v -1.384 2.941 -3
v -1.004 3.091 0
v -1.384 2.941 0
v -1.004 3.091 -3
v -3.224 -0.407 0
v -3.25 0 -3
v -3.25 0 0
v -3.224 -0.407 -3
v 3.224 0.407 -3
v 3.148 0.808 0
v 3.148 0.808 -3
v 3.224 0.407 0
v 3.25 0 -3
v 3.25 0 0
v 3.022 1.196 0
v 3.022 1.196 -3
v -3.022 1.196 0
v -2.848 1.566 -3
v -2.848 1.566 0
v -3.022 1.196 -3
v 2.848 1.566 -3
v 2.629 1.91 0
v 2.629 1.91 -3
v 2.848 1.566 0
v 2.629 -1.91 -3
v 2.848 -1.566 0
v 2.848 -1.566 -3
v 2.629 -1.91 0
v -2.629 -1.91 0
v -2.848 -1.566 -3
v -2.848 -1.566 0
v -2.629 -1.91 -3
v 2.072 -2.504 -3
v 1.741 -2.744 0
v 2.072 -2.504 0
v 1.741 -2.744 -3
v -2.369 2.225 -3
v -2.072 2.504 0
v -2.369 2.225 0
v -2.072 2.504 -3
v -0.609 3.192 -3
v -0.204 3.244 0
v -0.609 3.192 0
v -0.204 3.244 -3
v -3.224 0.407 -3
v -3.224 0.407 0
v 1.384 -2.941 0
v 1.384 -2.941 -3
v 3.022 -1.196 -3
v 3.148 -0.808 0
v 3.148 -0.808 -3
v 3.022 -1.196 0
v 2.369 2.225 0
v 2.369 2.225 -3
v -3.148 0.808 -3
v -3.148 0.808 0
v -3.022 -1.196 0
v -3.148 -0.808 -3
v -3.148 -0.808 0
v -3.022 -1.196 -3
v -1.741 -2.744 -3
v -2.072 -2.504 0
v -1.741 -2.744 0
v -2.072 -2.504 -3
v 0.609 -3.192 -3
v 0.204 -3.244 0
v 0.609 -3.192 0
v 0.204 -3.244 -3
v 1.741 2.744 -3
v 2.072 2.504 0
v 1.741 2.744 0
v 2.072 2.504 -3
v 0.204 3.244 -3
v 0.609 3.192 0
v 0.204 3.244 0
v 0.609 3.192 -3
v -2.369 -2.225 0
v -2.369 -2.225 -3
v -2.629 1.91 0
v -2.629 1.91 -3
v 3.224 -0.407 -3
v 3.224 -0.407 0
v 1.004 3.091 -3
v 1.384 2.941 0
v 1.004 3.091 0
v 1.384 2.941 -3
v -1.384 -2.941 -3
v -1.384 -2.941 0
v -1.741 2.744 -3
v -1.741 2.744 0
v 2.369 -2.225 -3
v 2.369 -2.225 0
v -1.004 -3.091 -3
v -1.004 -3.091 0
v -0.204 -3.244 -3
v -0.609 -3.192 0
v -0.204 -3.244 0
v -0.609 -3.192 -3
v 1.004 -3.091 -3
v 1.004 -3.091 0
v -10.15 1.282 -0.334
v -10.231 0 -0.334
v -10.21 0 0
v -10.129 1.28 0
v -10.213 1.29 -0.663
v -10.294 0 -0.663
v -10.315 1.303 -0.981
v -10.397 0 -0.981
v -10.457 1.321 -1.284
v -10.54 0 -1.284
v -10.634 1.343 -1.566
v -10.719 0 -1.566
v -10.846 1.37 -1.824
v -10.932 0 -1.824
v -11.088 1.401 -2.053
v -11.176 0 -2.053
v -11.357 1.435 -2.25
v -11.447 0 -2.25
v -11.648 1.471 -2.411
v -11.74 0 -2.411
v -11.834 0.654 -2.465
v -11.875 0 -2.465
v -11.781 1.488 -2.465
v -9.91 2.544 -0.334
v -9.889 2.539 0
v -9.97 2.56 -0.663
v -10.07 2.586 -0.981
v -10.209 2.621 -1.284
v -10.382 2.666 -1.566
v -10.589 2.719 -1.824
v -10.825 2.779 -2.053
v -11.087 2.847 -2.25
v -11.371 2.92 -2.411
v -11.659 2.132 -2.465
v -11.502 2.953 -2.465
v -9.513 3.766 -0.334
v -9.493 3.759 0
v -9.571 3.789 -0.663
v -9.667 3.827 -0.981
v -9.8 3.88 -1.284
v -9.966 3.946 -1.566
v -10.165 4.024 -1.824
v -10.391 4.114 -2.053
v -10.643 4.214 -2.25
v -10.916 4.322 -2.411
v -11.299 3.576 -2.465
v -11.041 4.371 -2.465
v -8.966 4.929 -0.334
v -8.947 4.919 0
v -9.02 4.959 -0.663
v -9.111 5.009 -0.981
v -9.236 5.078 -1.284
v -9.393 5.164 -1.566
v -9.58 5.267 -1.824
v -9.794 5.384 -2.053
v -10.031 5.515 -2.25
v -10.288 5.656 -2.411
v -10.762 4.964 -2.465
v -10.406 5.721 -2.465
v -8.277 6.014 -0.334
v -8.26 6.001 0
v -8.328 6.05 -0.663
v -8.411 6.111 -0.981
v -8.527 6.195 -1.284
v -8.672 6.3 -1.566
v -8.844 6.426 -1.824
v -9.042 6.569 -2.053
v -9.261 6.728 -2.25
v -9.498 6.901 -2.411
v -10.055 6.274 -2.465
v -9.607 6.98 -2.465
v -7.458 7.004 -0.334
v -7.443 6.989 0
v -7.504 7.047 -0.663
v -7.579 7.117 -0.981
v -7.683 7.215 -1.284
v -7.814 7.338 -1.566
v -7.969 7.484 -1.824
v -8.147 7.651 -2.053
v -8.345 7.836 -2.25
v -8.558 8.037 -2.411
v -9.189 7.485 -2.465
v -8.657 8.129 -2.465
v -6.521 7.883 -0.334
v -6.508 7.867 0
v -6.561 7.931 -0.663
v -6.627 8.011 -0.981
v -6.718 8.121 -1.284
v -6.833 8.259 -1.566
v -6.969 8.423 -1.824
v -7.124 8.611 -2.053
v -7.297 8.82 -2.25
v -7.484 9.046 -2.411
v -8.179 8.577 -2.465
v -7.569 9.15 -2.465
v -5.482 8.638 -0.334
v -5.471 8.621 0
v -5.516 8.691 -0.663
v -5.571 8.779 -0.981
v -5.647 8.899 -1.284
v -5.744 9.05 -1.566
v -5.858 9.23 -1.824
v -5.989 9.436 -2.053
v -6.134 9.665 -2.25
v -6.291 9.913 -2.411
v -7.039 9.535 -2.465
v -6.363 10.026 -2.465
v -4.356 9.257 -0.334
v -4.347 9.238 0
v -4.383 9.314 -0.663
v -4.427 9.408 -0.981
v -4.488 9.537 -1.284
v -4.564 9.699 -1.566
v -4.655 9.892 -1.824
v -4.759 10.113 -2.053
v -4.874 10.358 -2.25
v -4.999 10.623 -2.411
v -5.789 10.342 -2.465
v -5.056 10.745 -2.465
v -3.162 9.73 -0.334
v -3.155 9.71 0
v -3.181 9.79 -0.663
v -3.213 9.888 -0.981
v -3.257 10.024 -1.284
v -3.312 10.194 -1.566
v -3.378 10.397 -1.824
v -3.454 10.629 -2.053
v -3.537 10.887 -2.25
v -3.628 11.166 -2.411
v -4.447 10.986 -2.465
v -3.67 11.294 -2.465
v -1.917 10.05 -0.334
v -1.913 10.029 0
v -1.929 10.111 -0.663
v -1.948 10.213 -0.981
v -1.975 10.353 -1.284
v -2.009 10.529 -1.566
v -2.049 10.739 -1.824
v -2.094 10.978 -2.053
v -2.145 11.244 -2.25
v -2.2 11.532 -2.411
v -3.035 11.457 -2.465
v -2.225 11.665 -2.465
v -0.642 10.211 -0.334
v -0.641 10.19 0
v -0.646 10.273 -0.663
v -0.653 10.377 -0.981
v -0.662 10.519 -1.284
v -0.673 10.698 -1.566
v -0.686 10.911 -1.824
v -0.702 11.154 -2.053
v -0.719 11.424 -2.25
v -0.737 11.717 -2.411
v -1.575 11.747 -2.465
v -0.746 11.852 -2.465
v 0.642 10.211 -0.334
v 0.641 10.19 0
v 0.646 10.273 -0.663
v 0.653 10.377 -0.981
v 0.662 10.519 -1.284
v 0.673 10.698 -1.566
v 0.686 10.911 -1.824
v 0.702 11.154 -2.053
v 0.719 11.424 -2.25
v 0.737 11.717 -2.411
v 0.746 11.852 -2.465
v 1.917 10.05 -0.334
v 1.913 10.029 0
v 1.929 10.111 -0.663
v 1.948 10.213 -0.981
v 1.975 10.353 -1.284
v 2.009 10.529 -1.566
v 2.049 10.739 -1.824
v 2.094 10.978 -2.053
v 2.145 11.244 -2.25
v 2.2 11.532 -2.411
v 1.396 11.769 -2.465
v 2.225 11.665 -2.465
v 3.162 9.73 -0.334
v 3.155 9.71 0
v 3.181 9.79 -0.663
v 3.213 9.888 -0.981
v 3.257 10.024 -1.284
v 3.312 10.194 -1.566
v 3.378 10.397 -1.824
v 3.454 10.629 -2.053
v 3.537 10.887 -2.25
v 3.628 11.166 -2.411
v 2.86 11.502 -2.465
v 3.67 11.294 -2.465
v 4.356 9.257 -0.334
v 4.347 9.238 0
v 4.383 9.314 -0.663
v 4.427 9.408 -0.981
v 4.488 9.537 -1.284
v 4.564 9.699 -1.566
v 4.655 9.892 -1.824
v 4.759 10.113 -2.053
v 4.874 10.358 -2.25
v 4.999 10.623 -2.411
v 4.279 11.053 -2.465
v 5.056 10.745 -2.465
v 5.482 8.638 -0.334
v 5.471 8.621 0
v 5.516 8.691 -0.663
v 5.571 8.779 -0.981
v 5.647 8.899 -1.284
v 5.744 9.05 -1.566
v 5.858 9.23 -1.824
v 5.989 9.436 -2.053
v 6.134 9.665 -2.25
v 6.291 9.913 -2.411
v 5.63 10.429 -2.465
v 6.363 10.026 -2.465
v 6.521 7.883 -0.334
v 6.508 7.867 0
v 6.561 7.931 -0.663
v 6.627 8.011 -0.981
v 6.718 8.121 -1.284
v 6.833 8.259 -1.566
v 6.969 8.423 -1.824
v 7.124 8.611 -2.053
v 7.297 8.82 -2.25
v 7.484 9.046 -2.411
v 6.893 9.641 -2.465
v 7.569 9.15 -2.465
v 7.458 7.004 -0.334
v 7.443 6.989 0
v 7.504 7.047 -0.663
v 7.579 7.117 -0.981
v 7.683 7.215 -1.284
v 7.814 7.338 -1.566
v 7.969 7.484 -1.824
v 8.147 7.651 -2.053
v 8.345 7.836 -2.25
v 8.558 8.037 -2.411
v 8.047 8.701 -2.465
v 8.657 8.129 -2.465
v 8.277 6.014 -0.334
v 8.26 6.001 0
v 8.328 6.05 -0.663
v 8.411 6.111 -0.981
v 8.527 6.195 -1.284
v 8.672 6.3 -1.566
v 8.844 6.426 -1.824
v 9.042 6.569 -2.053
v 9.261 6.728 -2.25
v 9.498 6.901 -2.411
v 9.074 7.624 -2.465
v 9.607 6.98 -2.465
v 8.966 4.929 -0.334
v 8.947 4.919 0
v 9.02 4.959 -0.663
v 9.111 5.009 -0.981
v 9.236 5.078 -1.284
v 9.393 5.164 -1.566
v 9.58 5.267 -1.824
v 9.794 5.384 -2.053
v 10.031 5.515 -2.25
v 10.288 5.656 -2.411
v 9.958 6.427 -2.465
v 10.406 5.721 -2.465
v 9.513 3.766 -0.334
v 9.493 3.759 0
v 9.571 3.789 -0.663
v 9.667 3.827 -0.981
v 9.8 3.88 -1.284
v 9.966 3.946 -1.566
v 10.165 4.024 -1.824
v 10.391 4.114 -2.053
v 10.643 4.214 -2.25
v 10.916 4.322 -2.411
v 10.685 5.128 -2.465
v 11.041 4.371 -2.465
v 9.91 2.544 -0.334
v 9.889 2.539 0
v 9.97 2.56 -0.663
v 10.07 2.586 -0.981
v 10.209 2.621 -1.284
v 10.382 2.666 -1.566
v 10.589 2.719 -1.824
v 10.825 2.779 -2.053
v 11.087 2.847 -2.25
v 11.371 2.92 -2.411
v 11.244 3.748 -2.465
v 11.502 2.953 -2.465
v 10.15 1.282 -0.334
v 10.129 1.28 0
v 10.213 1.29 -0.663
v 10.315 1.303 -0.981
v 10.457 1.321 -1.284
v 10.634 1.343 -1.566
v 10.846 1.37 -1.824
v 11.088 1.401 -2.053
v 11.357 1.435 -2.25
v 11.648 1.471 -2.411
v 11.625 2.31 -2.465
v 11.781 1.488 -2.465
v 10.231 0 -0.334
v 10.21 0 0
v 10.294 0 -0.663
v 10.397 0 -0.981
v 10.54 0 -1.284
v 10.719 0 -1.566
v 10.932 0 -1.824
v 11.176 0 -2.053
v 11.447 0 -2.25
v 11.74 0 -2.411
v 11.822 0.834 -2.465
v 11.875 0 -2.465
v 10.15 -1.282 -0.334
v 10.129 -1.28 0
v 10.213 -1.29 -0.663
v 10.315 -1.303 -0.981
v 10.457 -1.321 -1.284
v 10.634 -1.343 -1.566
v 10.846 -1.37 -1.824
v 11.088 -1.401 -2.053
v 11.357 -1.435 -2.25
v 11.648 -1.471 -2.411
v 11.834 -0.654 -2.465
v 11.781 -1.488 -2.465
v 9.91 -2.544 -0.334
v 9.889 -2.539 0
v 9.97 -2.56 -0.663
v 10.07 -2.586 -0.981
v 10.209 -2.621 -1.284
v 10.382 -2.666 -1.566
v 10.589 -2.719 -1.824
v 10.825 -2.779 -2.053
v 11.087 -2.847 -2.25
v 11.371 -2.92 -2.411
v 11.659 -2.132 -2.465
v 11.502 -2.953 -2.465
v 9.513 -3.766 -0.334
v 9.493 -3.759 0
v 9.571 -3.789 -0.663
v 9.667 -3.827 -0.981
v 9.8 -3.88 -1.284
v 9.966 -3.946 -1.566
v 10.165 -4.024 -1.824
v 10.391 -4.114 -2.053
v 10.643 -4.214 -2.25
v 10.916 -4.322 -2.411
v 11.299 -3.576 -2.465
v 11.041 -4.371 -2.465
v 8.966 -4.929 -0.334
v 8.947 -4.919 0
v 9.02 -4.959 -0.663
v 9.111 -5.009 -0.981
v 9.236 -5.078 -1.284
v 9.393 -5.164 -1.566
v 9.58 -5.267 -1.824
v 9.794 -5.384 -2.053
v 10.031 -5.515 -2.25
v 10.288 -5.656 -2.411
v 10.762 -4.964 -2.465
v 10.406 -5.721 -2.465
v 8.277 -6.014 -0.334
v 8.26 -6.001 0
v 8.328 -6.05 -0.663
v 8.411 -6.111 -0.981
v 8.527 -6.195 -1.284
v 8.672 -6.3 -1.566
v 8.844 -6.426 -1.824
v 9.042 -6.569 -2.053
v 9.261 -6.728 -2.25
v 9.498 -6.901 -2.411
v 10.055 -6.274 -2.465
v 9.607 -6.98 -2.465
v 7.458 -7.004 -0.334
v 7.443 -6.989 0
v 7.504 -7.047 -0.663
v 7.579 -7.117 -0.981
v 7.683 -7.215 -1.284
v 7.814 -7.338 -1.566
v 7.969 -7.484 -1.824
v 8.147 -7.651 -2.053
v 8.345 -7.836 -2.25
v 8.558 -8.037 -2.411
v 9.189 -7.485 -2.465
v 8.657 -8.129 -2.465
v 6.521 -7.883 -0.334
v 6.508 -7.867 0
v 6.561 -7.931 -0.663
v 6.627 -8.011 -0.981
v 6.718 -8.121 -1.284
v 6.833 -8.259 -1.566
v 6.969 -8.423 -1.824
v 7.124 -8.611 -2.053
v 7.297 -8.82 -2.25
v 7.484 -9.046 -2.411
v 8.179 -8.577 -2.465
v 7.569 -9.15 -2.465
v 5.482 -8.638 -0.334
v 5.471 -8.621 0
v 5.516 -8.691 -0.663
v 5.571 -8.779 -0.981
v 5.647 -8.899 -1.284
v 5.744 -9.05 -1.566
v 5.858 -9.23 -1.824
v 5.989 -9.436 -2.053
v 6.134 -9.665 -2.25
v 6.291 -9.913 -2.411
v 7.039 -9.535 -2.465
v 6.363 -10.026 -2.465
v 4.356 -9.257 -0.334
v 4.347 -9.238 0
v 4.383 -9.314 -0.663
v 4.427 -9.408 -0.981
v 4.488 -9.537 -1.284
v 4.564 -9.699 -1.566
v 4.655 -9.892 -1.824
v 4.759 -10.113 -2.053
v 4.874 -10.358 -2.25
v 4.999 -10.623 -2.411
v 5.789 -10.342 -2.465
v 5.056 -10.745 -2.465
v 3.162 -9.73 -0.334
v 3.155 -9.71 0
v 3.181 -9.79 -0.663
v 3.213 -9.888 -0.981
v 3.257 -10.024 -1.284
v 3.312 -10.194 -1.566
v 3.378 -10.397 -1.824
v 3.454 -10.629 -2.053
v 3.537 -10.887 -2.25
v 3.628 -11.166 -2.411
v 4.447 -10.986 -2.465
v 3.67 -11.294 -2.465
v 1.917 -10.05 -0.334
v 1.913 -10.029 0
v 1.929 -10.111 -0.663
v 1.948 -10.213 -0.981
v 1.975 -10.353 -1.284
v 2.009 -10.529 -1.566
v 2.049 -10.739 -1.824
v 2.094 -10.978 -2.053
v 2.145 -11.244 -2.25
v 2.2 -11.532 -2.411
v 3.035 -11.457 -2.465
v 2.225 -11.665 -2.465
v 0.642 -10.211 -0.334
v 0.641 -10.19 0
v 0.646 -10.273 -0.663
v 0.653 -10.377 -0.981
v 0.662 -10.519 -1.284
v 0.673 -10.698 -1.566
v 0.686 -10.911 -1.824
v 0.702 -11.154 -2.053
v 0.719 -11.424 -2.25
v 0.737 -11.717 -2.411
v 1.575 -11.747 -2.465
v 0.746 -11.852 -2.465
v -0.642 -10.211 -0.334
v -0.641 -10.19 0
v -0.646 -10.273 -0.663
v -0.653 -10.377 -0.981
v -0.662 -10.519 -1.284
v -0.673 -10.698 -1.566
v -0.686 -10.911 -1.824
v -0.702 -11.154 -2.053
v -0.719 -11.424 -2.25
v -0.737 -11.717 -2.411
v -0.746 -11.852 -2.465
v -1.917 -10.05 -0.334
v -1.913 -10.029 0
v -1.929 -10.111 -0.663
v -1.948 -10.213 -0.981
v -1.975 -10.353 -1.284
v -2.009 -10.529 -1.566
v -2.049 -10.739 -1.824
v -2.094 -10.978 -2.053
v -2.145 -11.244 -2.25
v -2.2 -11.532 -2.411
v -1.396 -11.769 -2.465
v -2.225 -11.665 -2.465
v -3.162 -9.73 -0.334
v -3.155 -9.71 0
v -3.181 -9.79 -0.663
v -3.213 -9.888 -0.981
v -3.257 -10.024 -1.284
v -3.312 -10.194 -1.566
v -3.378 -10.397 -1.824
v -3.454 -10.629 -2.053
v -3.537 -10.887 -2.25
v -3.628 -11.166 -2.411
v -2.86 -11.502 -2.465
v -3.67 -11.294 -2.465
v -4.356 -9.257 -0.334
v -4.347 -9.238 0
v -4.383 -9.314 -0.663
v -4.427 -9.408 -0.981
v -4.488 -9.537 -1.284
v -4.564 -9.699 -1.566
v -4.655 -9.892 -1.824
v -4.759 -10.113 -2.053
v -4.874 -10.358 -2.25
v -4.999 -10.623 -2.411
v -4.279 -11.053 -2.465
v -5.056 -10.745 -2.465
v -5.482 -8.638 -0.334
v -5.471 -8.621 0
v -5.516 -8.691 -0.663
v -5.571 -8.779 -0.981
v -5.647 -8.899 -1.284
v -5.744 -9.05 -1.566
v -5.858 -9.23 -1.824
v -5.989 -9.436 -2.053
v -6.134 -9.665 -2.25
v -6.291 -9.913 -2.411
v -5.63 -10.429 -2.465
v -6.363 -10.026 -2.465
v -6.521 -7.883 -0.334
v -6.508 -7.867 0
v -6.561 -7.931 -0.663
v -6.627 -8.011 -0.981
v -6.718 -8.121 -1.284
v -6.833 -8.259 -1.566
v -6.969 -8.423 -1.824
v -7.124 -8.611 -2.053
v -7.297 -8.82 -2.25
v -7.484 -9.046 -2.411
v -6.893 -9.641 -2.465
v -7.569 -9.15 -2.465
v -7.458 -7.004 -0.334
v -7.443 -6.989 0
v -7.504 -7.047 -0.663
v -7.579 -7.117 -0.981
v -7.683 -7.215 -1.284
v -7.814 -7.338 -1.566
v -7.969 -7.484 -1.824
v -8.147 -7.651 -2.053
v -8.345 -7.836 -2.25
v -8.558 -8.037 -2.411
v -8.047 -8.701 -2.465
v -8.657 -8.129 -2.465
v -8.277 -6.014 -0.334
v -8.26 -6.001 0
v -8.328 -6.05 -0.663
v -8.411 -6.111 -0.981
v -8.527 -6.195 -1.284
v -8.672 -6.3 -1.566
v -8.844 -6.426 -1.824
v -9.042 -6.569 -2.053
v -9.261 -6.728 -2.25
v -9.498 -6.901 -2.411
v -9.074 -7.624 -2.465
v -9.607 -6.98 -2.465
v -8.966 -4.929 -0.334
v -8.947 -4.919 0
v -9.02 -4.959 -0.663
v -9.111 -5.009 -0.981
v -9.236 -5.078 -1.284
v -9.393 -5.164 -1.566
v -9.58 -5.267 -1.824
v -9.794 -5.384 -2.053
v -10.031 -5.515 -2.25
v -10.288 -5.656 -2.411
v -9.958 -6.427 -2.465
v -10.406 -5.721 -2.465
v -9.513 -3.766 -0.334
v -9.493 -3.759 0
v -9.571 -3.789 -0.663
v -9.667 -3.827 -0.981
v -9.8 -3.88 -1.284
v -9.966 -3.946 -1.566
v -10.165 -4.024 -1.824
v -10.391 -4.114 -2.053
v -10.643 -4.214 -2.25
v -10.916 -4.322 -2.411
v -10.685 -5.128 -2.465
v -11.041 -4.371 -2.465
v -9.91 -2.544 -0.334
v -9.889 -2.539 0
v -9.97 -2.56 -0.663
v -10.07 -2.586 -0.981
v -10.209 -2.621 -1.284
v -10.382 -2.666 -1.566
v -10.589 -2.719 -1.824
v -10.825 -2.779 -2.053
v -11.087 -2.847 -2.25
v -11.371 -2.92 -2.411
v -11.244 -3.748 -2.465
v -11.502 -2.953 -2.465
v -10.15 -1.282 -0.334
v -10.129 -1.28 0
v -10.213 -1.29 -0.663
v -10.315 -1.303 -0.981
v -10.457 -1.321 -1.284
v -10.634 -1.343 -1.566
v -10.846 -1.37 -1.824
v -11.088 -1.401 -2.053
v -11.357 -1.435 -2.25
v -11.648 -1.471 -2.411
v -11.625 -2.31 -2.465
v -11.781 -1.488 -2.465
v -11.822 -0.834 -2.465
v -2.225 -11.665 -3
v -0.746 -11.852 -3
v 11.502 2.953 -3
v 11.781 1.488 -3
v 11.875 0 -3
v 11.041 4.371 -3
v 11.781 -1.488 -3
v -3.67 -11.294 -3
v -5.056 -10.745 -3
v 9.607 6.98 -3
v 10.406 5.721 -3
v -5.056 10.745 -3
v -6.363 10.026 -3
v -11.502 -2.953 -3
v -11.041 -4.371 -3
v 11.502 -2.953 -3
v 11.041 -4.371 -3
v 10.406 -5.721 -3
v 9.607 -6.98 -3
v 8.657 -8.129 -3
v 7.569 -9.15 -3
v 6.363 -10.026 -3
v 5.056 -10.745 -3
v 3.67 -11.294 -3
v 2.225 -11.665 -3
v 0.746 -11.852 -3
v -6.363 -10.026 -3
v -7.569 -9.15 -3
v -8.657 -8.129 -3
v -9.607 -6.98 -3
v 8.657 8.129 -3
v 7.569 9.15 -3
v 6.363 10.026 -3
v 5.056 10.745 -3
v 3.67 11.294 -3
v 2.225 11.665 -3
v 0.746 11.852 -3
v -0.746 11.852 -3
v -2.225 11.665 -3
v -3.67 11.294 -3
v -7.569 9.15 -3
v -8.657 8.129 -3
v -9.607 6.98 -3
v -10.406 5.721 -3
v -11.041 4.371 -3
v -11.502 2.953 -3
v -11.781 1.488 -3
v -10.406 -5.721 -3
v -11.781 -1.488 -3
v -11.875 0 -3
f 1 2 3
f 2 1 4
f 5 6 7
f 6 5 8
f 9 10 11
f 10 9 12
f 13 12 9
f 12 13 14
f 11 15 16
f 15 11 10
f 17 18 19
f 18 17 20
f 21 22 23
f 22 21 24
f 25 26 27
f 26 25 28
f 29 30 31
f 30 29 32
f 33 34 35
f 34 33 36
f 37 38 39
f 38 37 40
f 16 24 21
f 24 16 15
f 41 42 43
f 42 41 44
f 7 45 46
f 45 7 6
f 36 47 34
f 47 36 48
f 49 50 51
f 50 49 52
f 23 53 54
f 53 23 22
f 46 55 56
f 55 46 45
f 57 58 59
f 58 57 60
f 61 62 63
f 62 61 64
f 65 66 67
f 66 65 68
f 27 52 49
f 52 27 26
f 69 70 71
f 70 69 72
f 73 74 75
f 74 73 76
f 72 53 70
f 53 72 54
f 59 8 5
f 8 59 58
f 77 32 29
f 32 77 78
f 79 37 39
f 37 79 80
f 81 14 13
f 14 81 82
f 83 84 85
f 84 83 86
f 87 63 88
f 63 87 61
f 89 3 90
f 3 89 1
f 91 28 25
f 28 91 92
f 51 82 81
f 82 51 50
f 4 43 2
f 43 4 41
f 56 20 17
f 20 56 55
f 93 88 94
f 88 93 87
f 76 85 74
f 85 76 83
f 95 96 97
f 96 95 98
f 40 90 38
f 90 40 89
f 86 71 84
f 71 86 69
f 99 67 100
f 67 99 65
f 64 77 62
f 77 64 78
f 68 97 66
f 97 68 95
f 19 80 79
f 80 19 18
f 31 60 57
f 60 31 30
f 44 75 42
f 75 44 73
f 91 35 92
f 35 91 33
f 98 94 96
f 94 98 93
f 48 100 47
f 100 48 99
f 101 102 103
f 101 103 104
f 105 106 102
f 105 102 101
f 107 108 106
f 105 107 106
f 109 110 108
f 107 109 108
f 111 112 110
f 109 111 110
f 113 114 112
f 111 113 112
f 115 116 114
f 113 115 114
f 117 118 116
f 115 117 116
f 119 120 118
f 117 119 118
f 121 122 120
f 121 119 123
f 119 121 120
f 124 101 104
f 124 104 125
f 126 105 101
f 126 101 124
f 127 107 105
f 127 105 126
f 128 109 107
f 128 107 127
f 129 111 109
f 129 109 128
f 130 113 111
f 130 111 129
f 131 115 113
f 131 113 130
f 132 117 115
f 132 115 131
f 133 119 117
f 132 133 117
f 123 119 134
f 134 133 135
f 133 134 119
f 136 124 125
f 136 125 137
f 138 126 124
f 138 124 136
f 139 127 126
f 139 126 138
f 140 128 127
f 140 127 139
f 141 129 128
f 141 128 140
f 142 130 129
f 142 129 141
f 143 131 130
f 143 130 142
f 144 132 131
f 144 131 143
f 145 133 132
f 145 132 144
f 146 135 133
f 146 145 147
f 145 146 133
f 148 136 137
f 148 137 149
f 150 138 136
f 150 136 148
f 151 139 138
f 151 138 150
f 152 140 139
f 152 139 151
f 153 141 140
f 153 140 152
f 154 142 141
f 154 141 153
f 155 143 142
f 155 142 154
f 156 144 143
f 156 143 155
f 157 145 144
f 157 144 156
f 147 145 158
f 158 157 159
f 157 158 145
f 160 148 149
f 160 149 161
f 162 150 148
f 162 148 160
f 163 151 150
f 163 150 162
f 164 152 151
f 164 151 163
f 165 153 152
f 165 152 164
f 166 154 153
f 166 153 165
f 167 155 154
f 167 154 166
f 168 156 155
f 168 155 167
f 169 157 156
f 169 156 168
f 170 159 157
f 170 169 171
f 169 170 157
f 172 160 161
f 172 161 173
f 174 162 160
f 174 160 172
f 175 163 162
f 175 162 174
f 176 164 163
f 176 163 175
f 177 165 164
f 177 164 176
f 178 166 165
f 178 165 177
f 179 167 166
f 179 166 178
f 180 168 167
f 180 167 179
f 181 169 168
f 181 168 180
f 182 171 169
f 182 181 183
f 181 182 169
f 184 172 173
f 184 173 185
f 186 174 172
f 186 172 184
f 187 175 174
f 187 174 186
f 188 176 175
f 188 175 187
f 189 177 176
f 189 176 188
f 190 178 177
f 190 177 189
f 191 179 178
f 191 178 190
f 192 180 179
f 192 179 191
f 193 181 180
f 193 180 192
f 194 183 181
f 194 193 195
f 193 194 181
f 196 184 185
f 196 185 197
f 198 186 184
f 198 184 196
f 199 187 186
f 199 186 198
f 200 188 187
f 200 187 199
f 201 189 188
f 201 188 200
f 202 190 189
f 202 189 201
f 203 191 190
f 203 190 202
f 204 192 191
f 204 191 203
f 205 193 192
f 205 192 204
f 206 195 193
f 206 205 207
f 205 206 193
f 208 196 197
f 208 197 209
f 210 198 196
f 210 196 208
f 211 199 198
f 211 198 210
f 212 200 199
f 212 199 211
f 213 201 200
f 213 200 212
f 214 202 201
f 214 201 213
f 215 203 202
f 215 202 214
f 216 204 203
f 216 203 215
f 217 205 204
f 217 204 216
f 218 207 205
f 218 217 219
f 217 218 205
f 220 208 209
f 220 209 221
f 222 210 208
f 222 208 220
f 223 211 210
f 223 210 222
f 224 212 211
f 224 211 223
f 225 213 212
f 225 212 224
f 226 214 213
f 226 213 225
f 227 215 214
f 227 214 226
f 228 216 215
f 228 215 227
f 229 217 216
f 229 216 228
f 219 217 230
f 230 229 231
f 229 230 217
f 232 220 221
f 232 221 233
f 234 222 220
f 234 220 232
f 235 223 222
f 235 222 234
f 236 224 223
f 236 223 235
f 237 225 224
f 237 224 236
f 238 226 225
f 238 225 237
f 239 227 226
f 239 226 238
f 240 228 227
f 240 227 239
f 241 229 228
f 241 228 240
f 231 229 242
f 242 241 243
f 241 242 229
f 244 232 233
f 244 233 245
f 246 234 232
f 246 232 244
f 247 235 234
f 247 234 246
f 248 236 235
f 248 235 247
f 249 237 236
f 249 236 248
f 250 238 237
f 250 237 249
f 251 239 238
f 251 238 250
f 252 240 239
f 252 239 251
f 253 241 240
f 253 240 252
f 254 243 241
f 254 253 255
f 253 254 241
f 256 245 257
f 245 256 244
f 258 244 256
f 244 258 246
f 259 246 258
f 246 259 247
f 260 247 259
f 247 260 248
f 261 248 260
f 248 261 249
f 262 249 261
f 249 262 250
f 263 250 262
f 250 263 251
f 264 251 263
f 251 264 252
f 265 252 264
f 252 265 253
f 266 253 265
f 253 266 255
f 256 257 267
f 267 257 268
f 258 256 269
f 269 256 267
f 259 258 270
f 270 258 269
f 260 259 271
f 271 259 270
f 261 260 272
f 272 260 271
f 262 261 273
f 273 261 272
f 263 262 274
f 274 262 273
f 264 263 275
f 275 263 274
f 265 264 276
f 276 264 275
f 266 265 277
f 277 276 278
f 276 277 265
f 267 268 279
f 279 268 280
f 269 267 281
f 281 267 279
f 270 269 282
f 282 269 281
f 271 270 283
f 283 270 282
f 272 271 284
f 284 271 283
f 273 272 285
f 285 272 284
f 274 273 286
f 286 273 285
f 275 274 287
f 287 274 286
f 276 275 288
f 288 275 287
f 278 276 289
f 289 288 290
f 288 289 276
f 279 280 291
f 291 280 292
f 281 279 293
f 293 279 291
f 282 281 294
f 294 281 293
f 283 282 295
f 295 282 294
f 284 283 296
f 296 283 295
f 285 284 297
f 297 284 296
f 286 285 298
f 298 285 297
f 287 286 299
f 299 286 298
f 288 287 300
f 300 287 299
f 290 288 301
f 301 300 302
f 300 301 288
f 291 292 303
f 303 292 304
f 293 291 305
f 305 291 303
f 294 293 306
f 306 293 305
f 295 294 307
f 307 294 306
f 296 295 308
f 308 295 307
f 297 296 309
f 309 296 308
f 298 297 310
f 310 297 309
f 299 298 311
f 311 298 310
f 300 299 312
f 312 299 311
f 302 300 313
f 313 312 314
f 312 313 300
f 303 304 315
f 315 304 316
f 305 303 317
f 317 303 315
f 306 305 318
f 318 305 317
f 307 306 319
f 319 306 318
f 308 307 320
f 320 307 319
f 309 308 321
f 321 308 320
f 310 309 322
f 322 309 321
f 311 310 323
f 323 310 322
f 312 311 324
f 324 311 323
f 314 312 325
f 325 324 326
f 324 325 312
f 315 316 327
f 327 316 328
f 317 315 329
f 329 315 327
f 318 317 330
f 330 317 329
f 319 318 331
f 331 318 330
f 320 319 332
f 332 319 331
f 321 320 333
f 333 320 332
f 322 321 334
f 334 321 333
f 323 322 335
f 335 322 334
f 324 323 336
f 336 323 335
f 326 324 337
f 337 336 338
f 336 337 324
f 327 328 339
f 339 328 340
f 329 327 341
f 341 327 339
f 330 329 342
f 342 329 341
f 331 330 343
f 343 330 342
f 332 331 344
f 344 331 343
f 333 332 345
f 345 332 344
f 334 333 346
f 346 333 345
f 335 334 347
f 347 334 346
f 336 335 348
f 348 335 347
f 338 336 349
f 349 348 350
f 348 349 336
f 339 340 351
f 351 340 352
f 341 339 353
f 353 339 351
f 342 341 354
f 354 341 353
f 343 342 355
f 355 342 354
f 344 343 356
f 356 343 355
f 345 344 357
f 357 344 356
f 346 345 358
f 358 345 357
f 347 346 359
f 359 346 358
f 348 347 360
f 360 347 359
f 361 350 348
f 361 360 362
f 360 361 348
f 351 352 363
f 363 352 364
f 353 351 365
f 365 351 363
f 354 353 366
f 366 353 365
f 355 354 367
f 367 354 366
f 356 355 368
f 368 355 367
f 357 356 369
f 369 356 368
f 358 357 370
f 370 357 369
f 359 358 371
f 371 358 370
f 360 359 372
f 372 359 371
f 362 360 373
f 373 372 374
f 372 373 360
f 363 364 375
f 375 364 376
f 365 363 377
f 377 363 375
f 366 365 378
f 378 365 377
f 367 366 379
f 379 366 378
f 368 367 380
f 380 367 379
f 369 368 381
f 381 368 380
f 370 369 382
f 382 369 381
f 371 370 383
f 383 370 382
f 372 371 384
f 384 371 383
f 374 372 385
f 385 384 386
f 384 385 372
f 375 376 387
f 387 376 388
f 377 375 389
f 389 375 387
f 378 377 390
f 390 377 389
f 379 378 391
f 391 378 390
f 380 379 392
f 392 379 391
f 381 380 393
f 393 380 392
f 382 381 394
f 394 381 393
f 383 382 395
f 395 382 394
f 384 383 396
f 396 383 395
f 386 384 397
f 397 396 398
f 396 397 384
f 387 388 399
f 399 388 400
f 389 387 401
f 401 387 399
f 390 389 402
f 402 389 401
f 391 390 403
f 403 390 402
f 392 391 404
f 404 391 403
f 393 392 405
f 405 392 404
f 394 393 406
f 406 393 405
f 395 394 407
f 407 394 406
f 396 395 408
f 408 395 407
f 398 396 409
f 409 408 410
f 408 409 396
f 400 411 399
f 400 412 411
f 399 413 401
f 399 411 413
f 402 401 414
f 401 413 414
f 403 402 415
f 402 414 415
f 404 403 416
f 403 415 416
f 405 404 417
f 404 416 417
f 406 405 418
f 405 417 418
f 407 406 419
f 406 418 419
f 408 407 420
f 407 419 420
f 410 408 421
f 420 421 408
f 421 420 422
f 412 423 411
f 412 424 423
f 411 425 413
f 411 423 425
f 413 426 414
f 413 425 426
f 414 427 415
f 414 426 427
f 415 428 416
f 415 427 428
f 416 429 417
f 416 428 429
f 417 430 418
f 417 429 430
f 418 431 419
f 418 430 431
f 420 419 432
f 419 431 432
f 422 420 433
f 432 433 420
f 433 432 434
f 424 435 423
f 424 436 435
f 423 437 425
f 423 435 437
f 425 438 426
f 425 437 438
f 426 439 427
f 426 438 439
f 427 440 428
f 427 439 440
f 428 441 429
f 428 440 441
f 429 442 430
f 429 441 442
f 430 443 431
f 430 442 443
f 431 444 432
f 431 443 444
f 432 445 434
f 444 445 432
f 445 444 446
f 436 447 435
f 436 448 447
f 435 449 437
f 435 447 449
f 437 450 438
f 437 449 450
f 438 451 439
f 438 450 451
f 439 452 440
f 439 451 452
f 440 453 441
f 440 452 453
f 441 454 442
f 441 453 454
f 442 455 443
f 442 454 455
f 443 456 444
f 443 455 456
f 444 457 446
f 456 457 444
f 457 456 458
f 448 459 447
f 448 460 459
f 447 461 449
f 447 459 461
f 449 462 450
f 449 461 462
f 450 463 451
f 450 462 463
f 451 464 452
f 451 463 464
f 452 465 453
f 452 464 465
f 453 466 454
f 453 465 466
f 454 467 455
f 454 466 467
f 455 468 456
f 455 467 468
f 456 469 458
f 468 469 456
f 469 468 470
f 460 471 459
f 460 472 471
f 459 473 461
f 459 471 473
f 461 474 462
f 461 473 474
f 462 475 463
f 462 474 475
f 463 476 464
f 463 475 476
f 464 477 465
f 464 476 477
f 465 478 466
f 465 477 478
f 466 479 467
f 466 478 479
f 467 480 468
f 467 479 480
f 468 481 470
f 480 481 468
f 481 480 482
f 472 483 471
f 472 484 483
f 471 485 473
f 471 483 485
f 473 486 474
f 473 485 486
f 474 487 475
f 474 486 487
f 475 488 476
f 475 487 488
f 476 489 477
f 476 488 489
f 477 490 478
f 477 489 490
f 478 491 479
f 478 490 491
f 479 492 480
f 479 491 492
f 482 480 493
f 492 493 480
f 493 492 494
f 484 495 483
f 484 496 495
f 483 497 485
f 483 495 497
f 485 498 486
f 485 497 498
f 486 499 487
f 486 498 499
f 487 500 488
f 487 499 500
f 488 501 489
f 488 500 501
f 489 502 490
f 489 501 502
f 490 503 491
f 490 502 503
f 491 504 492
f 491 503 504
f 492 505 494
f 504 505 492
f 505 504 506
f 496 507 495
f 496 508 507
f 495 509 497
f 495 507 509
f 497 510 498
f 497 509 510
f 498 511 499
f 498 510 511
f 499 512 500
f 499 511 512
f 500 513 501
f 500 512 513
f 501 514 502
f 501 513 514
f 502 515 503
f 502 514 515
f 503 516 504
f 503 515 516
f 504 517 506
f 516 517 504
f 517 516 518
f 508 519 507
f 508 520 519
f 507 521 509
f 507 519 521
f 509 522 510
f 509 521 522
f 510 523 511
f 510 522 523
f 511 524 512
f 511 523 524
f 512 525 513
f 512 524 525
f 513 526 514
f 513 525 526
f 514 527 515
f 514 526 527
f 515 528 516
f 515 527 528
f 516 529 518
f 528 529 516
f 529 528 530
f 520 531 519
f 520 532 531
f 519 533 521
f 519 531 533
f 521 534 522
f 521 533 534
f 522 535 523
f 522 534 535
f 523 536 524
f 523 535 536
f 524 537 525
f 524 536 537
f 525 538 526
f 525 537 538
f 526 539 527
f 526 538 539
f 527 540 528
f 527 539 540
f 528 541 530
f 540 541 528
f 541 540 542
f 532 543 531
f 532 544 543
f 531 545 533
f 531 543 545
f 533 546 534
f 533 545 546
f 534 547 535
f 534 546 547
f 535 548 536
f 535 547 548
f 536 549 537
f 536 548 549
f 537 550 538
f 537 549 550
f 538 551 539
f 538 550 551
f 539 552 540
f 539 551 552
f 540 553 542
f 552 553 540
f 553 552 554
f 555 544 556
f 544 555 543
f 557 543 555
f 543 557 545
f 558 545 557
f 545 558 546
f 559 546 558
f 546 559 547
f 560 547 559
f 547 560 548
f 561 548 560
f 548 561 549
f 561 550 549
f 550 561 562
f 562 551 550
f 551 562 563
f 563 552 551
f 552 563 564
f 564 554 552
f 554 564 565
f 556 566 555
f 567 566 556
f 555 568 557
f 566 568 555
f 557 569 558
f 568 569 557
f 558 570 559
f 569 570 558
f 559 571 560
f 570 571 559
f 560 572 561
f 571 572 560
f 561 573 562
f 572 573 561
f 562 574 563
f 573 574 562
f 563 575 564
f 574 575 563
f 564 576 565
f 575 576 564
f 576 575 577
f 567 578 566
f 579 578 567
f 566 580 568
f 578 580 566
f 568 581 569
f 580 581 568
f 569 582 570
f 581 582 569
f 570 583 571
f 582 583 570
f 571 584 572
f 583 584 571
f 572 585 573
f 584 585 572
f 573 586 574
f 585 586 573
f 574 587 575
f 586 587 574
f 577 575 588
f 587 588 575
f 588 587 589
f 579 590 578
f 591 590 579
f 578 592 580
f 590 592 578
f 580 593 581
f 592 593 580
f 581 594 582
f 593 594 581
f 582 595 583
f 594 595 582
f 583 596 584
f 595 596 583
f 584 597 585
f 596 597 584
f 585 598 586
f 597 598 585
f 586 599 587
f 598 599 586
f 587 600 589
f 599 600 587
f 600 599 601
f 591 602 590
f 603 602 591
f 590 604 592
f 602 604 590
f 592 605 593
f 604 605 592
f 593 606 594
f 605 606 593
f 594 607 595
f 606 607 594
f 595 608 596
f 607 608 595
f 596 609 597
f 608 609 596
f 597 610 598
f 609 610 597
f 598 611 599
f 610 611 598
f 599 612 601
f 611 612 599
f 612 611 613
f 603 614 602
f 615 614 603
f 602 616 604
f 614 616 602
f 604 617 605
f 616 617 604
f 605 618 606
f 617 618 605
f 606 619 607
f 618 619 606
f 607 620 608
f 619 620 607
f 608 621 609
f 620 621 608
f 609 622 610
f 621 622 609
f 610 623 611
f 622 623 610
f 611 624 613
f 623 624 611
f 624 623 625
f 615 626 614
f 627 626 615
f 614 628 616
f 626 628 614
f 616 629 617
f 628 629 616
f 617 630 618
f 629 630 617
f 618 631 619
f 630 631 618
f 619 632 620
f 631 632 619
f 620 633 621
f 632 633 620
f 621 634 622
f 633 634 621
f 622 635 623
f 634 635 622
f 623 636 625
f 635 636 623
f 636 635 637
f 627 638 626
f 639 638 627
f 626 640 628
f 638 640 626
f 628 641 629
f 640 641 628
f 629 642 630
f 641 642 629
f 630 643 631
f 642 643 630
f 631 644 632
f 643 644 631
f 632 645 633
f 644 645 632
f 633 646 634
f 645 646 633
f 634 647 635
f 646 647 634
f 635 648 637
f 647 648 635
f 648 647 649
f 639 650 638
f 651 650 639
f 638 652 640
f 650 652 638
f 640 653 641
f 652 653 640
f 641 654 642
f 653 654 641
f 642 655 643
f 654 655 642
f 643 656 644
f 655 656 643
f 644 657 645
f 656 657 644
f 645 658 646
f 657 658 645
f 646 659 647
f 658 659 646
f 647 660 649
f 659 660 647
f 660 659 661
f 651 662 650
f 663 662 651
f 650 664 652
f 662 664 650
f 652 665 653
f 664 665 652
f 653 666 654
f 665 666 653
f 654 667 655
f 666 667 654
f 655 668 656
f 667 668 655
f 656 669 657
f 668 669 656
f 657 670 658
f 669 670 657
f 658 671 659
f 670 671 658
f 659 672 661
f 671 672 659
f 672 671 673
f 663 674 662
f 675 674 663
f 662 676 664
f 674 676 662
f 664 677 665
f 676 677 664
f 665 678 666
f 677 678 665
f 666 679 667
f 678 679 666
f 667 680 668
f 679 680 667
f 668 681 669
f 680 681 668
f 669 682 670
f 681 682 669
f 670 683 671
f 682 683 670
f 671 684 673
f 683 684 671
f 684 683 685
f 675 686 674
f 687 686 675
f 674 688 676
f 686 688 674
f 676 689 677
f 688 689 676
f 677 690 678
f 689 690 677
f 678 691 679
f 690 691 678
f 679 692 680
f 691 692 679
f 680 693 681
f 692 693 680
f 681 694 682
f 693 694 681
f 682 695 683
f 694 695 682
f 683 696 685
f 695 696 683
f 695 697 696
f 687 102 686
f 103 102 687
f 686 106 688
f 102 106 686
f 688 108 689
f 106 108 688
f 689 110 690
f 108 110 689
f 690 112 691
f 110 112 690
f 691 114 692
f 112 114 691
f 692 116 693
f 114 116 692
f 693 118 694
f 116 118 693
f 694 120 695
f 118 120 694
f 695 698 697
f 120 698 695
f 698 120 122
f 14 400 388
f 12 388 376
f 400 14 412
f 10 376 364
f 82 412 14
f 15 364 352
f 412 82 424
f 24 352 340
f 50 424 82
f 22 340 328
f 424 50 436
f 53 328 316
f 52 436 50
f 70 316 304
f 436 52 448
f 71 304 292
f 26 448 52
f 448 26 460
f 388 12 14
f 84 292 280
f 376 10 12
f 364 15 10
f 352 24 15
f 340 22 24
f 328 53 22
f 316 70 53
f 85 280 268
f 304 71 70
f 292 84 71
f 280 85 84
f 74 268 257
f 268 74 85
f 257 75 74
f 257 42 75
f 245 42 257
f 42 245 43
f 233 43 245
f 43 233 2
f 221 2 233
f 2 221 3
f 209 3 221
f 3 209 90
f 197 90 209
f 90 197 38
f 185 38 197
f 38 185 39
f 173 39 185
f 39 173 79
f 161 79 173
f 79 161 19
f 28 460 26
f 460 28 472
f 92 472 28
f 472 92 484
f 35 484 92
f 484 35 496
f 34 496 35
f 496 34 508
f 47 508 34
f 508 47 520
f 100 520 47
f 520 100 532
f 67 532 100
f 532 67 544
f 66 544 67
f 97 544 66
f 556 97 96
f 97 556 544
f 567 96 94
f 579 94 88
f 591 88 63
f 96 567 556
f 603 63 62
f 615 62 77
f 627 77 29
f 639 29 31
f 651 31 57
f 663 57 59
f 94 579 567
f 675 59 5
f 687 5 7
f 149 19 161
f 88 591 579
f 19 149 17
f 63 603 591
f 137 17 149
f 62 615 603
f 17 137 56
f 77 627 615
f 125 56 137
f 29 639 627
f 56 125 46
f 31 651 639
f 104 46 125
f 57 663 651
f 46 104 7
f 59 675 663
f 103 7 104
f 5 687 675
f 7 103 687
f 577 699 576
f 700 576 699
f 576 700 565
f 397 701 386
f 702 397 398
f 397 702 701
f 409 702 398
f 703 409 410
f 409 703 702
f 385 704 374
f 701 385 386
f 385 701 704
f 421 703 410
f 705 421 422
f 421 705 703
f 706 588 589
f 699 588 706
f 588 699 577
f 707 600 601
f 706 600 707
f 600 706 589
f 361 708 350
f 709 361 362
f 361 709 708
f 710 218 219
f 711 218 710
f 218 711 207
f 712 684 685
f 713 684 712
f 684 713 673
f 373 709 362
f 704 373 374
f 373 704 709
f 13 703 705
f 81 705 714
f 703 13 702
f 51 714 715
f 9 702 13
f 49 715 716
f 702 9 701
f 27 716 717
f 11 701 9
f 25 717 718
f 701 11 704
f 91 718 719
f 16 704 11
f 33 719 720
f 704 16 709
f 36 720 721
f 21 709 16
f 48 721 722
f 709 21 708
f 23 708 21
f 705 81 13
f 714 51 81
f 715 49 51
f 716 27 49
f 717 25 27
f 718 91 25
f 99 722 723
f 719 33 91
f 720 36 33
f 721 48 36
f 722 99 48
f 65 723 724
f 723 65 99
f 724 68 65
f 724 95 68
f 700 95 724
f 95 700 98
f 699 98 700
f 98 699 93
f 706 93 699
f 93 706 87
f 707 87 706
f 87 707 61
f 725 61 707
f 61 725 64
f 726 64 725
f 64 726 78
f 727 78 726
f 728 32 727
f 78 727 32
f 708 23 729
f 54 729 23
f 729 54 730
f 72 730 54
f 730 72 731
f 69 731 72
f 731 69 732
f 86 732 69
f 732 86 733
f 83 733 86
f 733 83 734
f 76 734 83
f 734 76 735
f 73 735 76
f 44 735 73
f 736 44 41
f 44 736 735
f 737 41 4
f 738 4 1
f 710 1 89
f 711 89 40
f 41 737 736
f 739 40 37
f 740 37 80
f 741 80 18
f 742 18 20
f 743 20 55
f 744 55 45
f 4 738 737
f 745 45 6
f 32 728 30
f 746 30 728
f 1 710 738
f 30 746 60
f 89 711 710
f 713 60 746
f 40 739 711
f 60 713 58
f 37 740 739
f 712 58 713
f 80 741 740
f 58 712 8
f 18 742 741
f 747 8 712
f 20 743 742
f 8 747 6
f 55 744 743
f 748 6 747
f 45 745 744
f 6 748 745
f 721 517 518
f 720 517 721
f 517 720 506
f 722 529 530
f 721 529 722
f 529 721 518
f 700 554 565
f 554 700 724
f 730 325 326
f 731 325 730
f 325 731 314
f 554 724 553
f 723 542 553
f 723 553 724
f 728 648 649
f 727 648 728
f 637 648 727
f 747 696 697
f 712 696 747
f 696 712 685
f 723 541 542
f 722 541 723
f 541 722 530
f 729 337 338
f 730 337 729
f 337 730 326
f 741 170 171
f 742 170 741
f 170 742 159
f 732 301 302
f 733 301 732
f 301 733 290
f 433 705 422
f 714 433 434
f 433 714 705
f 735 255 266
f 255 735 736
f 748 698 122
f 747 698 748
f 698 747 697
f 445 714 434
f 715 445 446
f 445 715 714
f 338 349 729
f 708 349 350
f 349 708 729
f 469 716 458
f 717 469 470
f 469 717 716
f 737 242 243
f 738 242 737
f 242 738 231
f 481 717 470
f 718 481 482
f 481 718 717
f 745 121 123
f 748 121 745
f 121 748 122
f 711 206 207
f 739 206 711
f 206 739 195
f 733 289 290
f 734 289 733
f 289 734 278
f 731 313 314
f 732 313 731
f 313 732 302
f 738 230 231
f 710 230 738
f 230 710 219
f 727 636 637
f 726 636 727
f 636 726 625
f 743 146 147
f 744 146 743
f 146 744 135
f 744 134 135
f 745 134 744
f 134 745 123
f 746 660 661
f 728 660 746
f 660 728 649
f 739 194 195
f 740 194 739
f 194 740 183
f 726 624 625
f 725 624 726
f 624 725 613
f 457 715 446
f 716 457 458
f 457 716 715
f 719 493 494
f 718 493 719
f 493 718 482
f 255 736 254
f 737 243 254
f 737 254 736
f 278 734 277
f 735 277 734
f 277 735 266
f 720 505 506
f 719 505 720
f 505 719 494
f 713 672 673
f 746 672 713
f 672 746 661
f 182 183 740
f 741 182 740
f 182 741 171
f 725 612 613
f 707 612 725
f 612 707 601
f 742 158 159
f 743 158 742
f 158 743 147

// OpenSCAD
$fn = 50;


difference() {
	union() {
		*color(alpha = 1.0000000000, c = "gray") {
			translate(v = [0, 14, 0]) {
				linear_extrude(height = 1) {
					text(font = "Arial:style=Bold", halign = "center", size = 4.5000000000, text = "COMMENT description oobb_circle_shape_positive_type_6_depth_6_thickness_314_oring_type_true_both_holes_1.5833333333333333_diameter_11.875_radius_middle_zz", valign = "center");
				}
			}
		}
		translate(v = [0, 0, -3.0000000000]) {
			cylinder(h = 6, r = 11.8750000000);
		}
	}
	union() {
		*color(alpha = 1.0000000000, c = "gray") {
			translate(v = [0, 14, 0]) {
				linear_extrude(height = 1) {
					text(font = "Arial:style=Bold", halign = "center", size = 4.5000000000, text = "COMMENT description oobb_holes_shape_negative_type_6_thickness_314_oring_type_false_both_holes_1.5833333333333333_diameter_true_circle", valign = "center");
				}
			}
		}
		translate(v = [0.0000000000, 0.0000000000, -50.0000000000]) {
			cylinder(h = 100, r = 3.2500000000);
		}
		translate(v = [0.0000000000, 0.0000000000, -50.0000000000]) {
			cylinder(h = 100, r = 3.2500000000);
		}
		translate(v = [0.0000000000, 0.0000000000, -50.0000000000]) {
			cylinder(h = 100, r = 3.2500000000);
		}
		*color(alpha = 1.0000000000, c = "gray") {
			translate(v = [0, 14, 0]) {
				linear_extrude(height = 1) {
					text(font = "Arial:style=Bold", halign = "center", size = 4.5000000000, text = "COMMENT description oobb_oring_shape_negative_type_6_thickness_314_oring_type_true_both_holes_1.5833333333333333_diameter", valign = "center");
				}
			}
		}
		#rotate_extrude(angle = 360) {
			translate(v = [12.8750000000, 0, 0]) {
				circle(r = 2.6650000000);
			}
		}
		*color(alpha = 1.0000000000, c = "gray") {
			translate(v = [0, 14, 0]) {
				linear_extrude(height = 1) {
					text(font = "Arial:style=Bold", halign = "center", size = 4.5000000000, text = "COMMENT description oobb_slice_shape_negative_type_6_thickness_314_oring_type_true_both_holes_1.5833333333333333_diameter", valign = "center");
				}
			}
		}
		translate(v = [-250, -250, 0]) {
			cube(size = [500, 500, 500]);
		}
		translate(v = [-250, -250, 0]) {
			cube(size = [500, 500, 500]);
		}
		translate(v = [-250, -250, 0]) {
			cube(size = [500, 500, 500]);
		}
	}
}
